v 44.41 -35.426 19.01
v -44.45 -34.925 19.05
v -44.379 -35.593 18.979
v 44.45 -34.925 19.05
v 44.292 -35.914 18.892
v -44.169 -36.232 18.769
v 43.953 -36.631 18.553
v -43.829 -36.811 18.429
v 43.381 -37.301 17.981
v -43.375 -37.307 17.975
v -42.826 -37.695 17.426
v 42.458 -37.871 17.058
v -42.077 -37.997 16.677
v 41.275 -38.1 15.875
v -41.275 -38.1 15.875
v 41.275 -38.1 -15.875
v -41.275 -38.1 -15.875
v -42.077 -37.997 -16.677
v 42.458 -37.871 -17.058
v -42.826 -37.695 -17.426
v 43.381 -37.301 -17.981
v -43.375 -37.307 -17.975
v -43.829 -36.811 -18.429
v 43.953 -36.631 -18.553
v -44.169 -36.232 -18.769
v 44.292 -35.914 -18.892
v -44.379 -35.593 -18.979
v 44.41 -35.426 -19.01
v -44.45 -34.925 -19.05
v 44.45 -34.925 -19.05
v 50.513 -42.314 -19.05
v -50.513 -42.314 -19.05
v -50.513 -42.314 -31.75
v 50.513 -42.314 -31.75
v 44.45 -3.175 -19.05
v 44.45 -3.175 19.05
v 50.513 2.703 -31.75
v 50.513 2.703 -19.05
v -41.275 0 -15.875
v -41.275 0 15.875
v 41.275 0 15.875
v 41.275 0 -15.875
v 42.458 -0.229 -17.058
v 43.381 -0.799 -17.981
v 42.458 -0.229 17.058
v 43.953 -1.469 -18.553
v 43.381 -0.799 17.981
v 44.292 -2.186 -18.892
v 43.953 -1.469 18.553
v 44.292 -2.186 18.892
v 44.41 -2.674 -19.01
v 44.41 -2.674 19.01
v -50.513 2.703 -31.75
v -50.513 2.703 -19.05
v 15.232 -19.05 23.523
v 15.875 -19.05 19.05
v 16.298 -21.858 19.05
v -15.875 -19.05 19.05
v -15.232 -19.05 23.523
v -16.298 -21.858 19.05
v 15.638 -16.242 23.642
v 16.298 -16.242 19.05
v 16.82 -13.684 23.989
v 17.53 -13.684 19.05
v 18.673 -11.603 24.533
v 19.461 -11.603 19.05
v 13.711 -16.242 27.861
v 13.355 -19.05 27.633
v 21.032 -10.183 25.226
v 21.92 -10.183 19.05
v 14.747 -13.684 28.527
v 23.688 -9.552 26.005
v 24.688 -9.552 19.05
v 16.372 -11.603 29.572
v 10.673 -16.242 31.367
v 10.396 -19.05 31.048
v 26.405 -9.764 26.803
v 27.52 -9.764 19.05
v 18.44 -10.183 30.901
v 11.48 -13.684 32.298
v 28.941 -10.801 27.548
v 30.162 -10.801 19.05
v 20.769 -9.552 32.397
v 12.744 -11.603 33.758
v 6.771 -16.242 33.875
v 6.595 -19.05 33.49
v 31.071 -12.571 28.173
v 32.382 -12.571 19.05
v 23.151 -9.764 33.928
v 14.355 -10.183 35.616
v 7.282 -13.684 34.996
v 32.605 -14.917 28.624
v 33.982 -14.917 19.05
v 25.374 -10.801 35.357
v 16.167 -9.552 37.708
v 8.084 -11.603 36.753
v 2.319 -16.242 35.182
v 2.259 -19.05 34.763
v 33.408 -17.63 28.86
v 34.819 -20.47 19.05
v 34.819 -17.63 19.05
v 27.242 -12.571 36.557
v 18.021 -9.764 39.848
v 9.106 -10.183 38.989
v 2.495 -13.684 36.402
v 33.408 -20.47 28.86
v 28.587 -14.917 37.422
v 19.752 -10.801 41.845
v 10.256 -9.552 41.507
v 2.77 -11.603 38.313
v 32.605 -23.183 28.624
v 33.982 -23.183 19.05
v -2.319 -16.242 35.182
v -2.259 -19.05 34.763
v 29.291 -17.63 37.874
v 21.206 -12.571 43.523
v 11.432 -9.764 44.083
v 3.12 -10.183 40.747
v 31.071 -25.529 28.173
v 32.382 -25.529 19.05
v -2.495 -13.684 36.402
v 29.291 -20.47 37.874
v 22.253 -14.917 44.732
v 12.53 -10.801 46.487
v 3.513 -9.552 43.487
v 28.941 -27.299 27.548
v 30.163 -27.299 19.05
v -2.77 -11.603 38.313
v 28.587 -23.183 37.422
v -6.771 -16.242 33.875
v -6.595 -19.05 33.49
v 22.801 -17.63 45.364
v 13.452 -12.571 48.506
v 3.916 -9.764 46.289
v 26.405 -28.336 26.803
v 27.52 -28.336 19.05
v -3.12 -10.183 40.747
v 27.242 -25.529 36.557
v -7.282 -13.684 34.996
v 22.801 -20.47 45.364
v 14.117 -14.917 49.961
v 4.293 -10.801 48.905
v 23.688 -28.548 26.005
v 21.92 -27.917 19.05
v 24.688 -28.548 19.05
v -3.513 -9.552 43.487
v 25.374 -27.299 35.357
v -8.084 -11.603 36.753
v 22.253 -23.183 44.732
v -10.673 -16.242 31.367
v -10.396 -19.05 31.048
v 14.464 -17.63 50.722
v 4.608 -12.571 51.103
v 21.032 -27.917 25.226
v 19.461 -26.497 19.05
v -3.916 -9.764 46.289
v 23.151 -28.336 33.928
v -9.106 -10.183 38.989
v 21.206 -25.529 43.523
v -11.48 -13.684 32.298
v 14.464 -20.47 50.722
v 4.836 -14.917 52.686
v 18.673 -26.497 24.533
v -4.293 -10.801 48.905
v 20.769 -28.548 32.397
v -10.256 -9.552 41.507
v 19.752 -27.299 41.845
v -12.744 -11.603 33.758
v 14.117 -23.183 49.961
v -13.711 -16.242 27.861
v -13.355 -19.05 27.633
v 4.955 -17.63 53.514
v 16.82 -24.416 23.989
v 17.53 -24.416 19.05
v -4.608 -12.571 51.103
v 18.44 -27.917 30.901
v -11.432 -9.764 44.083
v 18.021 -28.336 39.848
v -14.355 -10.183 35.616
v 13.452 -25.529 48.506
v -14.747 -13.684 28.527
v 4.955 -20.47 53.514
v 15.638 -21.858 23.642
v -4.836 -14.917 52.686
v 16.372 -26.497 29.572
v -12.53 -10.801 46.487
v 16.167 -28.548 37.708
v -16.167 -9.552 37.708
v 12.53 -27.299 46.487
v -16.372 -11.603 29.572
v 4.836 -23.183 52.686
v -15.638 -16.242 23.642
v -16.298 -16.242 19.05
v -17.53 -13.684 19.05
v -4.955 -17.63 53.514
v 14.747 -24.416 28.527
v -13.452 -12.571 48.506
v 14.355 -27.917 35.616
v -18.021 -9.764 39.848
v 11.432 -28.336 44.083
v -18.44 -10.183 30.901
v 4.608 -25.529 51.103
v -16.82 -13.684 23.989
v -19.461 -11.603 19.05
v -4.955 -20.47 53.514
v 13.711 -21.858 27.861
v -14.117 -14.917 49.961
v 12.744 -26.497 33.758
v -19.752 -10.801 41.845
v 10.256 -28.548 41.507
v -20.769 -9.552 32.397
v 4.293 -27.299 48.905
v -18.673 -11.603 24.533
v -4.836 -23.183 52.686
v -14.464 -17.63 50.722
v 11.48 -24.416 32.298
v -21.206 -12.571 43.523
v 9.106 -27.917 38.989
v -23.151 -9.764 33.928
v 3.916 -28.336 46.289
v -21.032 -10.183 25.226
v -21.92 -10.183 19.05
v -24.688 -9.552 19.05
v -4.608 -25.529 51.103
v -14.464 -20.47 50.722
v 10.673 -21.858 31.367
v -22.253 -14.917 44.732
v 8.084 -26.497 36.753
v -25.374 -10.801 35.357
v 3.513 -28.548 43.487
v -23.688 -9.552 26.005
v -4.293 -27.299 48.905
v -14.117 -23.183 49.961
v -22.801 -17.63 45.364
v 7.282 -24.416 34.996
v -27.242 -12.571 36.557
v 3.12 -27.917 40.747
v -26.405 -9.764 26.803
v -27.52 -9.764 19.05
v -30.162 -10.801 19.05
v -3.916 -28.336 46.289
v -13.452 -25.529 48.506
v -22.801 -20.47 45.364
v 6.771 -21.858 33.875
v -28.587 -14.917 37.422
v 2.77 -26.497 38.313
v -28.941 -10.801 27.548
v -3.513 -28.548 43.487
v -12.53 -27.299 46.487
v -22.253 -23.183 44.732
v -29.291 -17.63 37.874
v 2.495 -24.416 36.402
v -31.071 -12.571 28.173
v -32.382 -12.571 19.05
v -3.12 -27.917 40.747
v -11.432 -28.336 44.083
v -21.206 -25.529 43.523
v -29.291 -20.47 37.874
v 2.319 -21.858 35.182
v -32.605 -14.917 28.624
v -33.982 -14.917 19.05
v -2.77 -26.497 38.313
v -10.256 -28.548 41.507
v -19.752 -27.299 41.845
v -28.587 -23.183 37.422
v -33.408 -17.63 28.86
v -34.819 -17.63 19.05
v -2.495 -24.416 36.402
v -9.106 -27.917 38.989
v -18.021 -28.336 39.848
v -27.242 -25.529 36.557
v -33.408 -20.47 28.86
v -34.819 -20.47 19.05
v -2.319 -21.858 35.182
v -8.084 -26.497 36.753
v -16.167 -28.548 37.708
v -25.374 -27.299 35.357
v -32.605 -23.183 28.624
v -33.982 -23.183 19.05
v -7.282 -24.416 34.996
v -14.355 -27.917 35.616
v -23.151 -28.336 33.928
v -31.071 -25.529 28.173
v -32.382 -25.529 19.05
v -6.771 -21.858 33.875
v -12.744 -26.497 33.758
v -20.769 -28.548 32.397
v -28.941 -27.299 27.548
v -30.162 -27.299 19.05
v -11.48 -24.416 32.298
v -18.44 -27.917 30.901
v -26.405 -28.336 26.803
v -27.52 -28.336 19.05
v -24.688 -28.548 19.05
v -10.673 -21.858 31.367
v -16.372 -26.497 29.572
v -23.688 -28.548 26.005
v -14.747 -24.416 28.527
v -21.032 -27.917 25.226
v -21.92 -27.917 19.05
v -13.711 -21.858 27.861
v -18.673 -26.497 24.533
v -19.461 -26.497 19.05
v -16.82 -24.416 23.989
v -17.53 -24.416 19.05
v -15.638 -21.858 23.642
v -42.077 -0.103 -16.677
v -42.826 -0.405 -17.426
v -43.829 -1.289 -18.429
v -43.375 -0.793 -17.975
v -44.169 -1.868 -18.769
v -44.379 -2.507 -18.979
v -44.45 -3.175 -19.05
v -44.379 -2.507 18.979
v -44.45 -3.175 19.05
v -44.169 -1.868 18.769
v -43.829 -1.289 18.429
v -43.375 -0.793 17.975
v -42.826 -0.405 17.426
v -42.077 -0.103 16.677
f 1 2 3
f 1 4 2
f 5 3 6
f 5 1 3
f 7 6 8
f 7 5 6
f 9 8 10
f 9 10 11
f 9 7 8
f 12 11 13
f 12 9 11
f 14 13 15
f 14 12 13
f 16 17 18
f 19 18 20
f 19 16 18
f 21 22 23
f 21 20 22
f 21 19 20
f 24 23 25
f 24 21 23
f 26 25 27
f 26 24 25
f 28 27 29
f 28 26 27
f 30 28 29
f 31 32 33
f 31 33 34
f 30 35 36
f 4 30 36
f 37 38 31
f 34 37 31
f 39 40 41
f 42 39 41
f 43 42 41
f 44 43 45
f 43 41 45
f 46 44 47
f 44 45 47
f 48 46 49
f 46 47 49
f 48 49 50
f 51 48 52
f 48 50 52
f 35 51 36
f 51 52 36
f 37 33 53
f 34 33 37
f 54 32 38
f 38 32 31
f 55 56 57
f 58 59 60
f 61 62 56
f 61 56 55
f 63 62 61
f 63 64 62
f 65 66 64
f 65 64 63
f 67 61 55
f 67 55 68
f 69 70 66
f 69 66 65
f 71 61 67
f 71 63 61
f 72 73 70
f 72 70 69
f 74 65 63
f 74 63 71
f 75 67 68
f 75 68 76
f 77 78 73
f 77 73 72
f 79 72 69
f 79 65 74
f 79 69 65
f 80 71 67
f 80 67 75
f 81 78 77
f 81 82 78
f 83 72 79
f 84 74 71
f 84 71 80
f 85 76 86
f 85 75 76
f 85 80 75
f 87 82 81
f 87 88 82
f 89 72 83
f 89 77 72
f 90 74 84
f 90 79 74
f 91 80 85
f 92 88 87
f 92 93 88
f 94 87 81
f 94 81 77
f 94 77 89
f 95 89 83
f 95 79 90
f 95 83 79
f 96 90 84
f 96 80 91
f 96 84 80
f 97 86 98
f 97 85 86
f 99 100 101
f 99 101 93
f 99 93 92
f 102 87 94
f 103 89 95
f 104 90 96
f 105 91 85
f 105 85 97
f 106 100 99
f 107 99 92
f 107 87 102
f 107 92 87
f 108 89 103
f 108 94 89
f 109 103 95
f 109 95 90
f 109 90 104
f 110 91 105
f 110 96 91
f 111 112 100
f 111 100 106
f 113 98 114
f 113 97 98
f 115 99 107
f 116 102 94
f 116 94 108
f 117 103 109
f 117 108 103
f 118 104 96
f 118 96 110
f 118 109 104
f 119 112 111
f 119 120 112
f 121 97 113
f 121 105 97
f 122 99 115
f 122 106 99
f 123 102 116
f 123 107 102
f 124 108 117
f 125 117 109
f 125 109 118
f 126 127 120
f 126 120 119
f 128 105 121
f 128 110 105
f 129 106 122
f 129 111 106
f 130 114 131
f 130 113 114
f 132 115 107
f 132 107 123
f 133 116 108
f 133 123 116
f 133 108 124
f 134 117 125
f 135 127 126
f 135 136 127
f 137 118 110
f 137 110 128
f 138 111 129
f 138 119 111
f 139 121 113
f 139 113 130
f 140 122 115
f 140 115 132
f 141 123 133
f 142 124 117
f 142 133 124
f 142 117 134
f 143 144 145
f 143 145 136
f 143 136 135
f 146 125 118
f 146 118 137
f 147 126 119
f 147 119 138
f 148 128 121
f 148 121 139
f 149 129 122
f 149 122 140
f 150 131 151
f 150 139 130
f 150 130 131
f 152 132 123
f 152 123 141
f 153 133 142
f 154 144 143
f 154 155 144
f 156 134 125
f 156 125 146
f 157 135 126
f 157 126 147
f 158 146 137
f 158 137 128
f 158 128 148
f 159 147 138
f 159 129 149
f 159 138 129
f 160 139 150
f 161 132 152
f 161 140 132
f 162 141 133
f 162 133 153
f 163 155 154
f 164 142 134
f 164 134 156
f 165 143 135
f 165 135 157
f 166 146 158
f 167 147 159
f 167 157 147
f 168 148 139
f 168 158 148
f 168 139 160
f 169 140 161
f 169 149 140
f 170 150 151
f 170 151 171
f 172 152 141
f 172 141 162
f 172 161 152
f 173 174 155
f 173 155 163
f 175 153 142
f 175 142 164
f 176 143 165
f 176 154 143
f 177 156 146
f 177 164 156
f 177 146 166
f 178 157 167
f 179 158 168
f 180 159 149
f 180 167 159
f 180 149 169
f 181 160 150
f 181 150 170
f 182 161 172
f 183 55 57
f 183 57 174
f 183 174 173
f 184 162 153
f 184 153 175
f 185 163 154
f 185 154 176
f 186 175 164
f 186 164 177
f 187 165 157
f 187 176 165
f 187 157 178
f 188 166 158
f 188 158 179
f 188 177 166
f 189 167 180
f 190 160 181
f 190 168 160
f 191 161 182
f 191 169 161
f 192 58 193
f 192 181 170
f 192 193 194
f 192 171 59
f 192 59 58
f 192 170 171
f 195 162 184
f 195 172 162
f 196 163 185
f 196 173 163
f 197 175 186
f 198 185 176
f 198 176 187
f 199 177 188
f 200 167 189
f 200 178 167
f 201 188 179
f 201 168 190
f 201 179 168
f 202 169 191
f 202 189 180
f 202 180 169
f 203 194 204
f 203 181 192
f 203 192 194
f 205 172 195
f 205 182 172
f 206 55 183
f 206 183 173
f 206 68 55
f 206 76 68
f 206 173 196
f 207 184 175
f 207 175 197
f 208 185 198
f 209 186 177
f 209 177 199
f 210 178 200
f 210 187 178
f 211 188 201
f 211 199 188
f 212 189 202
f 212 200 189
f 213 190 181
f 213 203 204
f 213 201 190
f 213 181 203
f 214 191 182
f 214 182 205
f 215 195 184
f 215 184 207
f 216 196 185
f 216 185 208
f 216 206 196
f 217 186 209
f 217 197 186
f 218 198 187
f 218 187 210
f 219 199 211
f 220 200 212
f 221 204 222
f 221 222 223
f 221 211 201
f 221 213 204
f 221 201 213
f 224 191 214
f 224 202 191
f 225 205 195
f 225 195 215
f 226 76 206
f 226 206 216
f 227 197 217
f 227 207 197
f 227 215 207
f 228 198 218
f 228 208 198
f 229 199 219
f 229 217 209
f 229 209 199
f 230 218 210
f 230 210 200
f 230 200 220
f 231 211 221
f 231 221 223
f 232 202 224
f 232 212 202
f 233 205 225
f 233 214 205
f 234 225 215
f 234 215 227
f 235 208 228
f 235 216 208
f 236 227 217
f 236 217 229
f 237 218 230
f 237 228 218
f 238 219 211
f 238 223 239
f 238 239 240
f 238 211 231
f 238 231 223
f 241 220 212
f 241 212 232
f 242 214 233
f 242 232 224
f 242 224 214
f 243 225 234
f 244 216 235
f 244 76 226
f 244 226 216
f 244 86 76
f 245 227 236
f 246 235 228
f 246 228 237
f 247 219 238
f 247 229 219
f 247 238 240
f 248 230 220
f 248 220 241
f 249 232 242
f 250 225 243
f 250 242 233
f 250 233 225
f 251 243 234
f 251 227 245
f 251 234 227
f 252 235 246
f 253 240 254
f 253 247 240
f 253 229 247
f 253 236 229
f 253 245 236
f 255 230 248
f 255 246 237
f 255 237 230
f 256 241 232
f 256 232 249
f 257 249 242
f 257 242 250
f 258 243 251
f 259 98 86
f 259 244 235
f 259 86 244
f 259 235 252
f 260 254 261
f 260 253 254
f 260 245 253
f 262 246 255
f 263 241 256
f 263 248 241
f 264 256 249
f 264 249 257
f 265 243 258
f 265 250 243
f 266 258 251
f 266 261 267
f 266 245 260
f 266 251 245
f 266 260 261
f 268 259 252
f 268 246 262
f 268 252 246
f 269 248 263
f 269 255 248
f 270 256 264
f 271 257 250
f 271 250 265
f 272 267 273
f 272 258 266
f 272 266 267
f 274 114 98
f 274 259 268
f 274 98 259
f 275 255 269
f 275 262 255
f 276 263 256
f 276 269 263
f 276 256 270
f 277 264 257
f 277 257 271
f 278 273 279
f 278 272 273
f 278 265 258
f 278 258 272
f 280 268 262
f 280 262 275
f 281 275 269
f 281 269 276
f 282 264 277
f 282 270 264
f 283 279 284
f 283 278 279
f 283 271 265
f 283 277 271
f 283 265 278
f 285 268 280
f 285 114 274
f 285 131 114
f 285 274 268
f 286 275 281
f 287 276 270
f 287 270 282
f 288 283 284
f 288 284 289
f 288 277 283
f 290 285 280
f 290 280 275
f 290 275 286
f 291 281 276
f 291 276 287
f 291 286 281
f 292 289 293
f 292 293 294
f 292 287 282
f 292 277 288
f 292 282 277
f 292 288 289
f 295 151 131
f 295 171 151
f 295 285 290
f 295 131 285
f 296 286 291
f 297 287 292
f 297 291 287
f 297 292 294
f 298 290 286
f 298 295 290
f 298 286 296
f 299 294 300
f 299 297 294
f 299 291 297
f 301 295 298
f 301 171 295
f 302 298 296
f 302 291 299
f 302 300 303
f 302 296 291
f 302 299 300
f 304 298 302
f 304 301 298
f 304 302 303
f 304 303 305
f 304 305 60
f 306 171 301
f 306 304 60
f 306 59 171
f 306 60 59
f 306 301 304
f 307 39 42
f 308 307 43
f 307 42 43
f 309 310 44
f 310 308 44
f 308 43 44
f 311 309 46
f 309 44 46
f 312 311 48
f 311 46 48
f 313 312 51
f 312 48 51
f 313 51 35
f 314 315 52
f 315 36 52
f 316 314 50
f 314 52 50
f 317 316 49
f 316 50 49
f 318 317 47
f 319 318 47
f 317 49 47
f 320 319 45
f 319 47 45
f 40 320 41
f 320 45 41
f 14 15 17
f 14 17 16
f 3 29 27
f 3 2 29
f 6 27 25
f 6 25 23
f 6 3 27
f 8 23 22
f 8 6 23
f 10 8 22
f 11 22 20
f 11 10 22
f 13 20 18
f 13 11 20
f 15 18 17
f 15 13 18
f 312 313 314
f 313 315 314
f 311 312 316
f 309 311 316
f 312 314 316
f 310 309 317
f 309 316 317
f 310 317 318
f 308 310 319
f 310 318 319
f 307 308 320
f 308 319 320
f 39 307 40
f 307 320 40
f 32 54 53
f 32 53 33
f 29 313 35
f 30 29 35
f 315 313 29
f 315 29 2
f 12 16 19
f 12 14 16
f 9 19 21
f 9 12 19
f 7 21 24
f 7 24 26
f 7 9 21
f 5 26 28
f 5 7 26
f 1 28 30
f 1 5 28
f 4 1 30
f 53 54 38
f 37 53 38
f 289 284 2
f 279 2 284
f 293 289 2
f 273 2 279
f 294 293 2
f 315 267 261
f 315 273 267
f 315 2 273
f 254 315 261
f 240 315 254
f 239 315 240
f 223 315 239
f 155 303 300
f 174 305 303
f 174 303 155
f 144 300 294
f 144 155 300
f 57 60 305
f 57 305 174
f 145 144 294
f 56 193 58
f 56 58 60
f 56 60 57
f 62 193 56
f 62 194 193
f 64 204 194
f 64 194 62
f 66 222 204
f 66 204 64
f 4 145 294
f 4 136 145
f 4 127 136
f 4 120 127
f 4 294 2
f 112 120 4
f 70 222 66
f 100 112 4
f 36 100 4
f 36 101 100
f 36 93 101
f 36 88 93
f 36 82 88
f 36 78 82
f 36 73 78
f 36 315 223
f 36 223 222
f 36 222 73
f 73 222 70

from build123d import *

# Parameters (mm, degrees)
F0_W     = 88.9
F0_H     = 38.1
F1_DEPTH = 38.1
F2_R     = 9.525
F4_R     = 3.175
F5_W     = 101.025582
F5_H     = 45.01648
F6_DEPTH = 12.7


with BuildPart() as f1:
    # F0 (on Front) → F1 (new body)
    with BuildSketch(Plane.XZ):
        Rectangle(F0_W, F0_H)
    extrude(amount=F1_DEPTH)

    # F2 (on face) → F3 (revolve)
    with BuildSketch(Plane.XY.offset(19.05)):
        with Locations((-25.4, -19.05)):
            Circle(F2_R)
    revolve(axis=Axis((0, -24.738075, 19.05), (0, -1, 0)))

    # F4
    f4_edges = [f1.edges().sort_by_distance(p)[0] for p in [
        (44.45, -38.1, 0),
        (0, -38.1, 19.05),
        (-44.45, -38.1, 0),
        (0, -38.1, -19.05),
        (44.45, 0, 0),
        (0, 0, 19.05),
        (-44.45, 0, 0),
        (0, 0, -19.05),
    ]]
    fillet(f4_edges, radius=F4_R)


with BuildPart() as f6:
    # F5 (on face) → F6 (new body)
    with BuildSketch(Plane(origin=(0, 0, -19.05), x_dir=(1, 0, 0), z_dir=(0, 0, -1))):
        with Locations((0, 19.805645)):
            Rectangle(F5_W, F5_H)
    extrude(amount=F6_DEPTH)


solid = Compound([f1.part, f6.part])
